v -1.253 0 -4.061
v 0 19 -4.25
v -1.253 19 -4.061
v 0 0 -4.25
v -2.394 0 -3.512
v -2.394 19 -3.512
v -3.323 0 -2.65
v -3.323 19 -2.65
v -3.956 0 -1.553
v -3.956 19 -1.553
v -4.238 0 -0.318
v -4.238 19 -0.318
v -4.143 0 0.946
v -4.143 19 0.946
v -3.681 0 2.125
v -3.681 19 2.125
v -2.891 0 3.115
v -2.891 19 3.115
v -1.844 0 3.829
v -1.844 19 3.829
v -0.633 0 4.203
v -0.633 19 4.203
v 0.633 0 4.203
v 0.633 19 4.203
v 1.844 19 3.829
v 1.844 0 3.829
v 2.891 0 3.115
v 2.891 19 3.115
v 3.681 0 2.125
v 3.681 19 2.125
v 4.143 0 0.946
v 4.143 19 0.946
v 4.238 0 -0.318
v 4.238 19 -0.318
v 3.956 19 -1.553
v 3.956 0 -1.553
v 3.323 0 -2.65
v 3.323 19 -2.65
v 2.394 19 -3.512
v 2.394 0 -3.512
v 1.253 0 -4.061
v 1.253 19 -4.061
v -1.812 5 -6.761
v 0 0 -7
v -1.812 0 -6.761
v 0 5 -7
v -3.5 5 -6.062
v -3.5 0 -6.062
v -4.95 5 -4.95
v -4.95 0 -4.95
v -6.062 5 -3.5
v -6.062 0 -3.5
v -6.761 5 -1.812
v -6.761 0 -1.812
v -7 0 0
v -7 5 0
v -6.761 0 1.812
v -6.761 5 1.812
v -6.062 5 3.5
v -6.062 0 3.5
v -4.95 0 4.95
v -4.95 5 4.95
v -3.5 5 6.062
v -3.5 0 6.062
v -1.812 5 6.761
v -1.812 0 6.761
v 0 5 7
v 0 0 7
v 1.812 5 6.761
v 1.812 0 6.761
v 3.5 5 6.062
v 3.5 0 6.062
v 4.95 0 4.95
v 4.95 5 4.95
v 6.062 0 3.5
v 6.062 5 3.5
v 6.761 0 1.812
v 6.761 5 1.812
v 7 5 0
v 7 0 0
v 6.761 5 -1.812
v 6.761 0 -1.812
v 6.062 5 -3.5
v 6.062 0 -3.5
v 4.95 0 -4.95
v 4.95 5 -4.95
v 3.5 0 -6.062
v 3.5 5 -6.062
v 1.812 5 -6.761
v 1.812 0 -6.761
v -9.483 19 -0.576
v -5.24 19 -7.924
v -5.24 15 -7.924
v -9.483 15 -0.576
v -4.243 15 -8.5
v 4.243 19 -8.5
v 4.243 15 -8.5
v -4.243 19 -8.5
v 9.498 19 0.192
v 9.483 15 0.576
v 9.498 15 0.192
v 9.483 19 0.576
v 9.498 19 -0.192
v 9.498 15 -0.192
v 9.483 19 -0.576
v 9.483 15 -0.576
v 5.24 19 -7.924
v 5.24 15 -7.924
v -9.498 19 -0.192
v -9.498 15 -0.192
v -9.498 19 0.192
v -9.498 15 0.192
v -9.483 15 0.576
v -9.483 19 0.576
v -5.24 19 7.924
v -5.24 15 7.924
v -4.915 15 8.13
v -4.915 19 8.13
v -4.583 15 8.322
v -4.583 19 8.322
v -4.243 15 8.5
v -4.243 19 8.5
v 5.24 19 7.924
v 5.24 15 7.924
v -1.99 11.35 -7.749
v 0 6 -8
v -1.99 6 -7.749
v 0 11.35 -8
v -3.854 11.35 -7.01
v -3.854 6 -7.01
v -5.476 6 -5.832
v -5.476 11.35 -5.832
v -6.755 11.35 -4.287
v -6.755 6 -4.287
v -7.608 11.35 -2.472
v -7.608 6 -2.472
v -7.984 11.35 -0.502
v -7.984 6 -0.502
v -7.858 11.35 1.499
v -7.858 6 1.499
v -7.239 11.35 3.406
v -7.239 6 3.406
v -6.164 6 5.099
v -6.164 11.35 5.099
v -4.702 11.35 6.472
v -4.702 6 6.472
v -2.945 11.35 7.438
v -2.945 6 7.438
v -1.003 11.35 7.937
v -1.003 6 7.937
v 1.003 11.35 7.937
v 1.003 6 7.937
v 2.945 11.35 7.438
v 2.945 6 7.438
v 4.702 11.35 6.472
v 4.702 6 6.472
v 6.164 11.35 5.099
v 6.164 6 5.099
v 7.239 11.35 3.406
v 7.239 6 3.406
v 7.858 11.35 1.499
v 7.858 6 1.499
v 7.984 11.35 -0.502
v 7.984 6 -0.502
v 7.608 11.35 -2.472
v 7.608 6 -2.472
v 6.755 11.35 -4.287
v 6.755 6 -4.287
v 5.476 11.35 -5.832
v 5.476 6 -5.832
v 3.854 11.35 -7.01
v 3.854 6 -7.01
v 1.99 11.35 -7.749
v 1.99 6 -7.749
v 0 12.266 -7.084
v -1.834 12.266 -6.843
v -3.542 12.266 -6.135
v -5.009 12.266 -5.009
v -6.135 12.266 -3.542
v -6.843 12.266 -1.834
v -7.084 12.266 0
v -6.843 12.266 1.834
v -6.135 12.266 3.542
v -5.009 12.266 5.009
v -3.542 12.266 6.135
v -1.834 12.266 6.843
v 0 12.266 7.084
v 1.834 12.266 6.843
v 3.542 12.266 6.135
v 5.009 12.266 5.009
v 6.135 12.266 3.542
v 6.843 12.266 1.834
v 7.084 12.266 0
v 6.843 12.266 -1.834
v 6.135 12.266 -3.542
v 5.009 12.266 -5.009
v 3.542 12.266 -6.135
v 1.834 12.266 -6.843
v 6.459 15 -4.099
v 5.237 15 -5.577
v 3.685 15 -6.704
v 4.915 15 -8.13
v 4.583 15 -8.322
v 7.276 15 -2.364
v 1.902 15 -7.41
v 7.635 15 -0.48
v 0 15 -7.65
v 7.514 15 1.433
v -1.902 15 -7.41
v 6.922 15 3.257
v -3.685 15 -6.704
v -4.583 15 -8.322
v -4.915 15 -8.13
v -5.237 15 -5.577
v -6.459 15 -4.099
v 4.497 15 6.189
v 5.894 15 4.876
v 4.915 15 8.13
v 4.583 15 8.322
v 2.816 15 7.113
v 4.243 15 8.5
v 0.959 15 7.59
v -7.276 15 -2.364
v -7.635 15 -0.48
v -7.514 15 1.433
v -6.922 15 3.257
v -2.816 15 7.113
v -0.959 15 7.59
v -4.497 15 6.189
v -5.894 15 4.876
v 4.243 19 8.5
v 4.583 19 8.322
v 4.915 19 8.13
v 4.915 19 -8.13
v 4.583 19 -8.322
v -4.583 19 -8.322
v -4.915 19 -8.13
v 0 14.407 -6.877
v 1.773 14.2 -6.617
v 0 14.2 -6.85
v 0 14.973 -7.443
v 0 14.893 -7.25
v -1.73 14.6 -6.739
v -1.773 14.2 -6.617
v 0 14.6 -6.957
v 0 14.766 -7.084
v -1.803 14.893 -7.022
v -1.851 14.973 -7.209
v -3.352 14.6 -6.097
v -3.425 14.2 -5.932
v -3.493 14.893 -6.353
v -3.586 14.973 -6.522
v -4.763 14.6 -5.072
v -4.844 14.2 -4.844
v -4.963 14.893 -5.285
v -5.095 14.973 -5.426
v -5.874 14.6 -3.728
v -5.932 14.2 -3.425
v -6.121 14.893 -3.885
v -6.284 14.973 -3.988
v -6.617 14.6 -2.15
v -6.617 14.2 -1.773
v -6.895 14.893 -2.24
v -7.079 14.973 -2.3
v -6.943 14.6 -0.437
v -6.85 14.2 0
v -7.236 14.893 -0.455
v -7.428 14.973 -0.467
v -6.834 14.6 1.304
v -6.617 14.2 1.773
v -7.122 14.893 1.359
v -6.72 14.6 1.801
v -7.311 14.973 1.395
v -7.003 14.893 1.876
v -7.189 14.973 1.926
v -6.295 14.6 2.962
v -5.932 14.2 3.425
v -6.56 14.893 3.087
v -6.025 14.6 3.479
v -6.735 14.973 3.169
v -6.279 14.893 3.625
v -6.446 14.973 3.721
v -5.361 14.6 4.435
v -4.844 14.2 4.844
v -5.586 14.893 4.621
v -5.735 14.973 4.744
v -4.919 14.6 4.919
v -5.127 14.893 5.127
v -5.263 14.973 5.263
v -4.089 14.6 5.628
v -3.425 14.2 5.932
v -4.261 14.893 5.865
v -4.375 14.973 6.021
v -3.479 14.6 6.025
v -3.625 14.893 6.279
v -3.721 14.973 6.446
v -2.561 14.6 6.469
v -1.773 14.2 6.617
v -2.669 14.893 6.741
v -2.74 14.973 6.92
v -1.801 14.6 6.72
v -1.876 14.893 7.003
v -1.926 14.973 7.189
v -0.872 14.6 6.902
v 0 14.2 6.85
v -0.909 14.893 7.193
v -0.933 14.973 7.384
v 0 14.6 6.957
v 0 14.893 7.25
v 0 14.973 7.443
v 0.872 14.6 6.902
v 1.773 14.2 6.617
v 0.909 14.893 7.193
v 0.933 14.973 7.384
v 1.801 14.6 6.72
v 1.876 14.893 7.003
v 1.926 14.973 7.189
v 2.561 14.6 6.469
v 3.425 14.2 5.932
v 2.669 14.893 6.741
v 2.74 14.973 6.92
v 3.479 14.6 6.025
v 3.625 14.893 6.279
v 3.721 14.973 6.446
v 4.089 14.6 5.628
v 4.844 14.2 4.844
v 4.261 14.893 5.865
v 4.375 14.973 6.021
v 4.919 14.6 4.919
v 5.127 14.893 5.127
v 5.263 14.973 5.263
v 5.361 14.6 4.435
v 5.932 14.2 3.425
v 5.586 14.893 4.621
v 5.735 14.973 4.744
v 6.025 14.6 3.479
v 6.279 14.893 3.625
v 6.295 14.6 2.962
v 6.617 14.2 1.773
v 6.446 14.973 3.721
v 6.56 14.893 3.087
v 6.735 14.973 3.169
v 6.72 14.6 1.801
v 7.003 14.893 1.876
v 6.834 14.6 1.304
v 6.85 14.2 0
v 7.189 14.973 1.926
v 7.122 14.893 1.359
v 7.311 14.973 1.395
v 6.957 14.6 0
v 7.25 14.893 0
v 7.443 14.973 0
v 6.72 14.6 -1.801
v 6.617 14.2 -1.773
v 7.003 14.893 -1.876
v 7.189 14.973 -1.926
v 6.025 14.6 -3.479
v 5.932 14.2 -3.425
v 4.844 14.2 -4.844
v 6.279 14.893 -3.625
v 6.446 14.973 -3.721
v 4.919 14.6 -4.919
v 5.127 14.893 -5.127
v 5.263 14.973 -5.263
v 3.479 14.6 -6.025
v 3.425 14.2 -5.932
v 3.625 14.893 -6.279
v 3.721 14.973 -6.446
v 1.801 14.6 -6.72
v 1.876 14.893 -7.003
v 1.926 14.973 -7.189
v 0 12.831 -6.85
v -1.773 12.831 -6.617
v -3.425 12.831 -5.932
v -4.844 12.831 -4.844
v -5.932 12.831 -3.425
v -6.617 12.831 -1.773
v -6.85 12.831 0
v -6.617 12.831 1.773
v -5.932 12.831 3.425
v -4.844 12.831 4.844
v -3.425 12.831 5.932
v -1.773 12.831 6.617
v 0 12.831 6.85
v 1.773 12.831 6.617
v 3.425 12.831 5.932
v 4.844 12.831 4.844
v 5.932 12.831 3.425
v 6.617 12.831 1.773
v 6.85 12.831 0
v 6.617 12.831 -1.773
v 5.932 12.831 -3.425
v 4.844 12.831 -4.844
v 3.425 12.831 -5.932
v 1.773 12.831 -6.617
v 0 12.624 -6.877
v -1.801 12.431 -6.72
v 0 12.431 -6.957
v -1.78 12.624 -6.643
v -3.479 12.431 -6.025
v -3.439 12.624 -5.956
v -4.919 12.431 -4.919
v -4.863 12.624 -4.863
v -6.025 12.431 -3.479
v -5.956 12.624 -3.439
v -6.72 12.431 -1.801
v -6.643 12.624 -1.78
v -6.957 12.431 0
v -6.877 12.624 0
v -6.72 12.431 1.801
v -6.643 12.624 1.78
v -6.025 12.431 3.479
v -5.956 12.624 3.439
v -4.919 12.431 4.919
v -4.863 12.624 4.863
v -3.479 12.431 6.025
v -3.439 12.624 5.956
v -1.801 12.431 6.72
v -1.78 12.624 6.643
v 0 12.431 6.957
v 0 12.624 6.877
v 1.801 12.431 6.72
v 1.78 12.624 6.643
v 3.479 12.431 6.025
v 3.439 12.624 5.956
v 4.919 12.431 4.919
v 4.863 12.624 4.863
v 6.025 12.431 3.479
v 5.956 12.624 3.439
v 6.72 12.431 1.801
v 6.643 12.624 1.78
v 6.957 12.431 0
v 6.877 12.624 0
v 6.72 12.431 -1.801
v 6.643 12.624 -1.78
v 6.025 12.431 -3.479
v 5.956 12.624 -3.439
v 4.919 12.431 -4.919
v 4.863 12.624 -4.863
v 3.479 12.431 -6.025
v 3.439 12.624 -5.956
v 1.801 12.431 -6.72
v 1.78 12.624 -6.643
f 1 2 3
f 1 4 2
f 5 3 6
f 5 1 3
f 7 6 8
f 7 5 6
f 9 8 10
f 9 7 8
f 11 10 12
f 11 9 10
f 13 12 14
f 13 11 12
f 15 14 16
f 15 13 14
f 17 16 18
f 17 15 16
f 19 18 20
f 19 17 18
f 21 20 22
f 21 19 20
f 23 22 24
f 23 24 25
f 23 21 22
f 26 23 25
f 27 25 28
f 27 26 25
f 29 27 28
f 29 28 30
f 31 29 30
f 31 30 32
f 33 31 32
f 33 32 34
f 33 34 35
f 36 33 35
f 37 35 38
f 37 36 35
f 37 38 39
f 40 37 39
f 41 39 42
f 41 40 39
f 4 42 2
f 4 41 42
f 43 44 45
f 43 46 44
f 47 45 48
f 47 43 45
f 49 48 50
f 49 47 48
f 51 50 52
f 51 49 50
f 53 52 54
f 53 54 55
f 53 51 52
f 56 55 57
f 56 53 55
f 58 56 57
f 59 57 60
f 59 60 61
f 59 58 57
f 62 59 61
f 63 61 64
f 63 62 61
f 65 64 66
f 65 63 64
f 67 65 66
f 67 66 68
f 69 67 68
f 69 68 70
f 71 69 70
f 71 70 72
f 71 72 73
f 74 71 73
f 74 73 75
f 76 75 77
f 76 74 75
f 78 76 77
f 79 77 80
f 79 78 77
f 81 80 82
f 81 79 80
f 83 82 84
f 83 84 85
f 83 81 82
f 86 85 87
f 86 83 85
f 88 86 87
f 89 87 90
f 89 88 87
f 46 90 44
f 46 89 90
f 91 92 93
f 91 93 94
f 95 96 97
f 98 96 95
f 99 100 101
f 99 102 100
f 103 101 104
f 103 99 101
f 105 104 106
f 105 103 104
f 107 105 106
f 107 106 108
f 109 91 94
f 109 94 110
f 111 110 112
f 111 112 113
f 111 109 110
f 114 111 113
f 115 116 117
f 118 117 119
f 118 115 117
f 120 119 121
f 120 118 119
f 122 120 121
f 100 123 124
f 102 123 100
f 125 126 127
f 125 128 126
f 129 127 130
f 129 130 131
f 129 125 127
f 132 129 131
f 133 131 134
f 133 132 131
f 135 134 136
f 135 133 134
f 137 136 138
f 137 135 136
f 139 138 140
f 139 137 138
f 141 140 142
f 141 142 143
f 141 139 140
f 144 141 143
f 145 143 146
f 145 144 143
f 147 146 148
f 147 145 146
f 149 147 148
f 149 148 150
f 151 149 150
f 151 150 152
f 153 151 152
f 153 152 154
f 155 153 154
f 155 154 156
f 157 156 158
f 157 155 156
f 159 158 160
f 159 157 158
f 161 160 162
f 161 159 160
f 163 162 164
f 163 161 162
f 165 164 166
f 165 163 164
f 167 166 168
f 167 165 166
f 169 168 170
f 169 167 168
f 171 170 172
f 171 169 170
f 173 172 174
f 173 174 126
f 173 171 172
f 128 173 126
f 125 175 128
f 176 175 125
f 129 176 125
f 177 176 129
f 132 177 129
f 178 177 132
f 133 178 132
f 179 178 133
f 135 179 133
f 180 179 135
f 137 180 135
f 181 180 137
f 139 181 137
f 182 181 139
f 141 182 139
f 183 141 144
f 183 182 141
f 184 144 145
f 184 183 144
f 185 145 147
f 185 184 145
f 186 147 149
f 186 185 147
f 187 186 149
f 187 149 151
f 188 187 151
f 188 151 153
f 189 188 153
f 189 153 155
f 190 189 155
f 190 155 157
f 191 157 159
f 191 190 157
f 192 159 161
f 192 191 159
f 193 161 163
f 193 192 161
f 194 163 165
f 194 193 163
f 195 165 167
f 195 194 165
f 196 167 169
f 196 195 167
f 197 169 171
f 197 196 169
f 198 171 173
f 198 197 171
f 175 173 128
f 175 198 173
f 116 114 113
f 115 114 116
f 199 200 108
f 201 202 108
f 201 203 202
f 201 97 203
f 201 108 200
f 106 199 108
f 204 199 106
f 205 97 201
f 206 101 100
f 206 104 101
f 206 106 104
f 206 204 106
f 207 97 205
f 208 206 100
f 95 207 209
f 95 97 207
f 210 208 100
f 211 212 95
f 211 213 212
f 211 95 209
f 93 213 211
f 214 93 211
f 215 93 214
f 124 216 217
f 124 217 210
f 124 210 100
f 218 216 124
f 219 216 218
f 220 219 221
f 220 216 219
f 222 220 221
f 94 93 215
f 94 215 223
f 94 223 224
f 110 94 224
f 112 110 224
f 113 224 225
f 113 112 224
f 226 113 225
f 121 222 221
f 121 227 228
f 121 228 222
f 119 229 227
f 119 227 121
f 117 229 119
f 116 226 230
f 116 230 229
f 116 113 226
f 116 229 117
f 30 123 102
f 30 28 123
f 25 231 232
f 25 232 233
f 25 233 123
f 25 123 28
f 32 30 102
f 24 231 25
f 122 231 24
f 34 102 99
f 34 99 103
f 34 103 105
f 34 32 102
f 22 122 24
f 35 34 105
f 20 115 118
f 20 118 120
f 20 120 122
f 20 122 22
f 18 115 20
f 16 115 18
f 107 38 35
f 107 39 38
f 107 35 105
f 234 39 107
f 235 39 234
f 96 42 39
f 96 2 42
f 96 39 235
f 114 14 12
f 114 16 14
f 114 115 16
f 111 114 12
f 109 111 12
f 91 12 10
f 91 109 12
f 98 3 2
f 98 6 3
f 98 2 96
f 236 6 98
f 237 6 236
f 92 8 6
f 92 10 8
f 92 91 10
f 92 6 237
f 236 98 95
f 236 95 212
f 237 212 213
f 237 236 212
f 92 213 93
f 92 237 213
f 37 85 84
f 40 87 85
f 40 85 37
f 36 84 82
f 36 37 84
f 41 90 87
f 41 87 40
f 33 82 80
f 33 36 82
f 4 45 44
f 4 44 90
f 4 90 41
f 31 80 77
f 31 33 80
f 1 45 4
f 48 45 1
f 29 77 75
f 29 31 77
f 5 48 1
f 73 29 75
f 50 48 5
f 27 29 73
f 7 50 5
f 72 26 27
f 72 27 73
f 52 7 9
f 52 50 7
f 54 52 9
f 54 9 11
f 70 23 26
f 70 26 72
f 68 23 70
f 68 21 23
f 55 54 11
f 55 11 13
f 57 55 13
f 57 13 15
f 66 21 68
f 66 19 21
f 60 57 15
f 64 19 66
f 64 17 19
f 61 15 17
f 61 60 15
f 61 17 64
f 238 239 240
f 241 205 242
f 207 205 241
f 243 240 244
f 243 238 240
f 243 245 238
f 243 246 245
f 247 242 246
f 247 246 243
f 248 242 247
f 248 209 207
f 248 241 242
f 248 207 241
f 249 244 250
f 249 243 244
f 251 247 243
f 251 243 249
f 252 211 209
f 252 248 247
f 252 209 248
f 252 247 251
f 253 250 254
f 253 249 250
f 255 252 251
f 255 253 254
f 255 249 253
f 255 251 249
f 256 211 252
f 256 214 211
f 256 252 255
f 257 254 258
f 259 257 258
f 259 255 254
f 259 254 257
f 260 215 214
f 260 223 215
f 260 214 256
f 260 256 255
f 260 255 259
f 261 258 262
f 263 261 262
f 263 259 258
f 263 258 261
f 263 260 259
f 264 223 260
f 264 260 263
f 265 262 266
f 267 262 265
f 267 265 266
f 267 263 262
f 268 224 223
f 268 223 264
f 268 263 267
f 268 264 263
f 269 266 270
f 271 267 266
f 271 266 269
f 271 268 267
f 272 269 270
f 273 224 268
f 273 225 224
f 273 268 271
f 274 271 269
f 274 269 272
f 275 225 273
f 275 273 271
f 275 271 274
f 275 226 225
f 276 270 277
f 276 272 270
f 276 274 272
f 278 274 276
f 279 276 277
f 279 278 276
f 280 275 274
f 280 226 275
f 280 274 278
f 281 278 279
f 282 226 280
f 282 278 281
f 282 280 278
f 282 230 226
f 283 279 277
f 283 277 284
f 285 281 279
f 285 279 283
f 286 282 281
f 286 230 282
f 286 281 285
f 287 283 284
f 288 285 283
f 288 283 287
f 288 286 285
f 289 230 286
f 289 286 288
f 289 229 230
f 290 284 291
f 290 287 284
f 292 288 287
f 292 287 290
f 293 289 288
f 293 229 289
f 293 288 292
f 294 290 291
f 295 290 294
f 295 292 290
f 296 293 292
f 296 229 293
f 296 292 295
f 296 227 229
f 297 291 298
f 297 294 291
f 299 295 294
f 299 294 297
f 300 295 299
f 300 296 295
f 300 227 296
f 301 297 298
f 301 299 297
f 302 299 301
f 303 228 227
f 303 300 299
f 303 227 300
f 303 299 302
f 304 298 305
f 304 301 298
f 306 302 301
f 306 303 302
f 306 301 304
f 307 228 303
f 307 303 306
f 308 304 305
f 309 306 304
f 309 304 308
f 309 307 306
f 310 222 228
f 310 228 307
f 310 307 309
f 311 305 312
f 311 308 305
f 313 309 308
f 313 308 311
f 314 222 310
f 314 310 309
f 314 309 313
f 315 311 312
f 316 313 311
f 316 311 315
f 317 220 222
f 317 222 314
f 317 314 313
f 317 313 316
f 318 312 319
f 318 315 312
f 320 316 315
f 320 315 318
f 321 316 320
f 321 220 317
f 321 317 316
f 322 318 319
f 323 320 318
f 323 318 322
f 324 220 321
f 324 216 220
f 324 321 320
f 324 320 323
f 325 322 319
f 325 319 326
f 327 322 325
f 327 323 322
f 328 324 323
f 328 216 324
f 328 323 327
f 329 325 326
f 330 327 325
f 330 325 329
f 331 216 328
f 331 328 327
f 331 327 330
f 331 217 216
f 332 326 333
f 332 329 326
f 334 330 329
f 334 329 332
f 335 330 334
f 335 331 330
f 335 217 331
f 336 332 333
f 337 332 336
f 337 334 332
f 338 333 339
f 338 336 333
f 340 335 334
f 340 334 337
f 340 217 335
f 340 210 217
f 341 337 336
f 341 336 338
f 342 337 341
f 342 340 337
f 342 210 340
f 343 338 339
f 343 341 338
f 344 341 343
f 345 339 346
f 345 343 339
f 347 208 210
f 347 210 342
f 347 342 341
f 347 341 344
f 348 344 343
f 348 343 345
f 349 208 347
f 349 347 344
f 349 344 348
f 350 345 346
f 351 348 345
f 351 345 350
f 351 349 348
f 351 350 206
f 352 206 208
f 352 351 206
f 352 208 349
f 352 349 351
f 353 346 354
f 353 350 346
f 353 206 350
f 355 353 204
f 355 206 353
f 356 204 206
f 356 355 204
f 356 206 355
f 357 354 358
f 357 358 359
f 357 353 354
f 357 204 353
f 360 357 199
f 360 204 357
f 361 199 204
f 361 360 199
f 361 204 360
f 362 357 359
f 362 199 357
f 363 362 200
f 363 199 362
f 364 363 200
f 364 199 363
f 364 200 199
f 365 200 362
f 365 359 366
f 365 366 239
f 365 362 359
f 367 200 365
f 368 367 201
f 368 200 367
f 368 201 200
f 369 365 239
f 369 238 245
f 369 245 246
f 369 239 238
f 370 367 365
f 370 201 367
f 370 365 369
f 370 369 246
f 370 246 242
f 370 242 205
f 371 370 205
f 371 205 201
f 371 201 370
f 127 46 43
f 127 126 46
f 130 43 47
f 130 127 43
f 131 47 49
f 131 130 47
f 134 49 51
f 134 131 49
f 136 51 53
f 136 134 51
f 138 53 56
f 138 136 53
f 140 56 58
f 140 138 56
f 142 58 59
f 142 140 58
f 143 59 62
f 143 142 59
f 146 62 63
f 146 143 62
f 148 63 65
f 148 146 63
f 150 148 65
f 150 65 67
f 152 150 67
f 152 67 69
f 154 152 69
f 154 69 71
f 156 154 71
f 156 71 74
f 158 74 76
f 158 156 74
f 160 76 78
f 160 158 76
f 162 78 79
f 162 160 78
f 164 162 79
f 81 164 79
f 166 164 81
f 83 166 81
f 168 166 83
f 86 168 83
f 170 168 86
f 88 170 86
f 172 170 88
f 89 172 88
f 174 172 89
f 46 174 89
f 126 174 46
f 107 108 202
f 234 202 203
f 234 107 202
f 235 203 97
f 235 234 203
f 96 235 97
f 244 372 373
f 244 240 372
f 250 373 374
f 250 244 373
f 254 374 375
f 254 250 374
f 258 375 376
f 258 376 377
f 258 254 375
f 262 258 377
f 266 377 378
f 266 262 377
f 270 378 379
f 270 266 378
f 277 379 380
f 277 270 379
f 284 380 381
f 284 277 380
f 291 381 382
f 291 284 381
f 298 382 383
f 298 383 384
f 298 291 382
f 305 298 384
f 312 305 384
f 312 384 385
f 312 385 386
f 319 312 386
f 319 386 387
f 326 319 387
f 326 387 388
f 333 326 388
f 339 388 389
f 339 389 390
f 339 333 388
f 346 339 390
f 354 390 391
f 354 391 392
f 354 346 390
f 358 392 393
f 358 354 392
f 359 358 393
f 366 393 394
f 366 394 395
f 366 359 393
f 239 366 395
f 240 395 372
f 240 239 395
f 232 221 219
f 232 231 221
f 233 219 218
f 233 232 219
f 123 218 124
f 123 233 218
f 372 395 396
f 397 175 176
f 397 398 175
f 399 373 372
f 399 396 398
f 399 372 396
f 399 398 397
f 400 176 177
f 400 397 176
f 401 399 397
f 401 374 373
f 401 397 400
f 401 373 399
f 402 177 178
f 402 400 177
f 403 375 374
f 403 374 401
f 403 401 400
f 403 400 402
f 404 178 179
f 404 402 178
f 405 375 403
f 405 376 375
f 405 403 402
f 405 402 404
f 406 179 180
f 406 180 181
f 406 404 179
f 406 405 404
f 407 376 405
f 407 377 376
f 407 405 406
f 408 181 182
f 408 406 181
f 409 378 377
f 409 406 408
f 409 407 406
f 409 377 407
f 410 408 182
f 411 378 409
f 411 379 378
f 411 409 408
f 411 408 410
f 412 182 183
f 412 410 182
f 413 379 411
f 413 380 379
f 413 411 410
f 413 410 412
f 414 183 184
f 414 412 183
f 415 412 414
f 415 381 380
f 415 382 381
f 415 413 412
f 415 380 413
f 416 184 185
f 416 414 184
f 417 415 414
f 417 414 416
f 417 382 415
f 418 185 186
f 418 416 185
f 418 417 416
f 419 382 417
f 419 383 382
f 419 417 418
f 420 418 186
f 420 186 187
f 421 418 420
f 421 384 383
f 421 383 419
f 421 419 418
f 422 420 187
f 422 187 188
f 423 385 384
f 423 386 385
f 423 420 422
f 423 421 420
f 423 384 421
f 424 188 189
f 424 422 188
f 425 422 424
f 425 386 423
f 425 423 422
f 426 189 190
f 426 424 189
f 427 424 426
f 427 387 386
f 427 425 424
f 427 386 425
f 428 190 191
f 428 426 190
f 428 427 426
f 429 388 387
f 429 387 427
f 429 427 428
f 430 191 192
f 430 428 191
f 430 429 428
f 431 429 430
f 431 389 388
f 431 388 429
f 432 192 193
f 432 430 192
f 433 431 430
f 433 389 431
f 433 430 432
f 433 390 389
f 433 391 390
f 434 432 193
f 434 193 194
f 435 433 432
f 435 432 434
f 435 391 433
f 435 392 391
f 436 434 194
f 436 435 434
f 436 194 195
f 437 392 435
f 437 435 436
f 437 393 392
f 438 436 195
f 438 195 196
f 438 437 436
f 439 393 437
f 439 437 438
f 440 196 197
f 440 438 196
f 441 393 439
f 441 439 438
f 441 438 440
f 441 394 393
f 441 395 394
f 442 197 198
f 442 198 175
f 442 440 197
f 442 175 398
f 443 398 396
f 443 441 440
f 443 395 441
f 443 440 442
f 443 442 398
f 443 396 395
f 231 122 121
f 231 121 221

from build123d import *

# Parameters (mm, degrees)
SKETCH_2_OUTSIDE_W  = 27.582
SKETCH_2_OUTSIDE_H  = 27.582
CUT_EXTRUDE_1_DEPTH = 24.270152556


with BuildPart() as part:
    # Эскиз1 → Повернуть1 (revolve)
    with BuildSketch(Plane.XY, mode=Mode.PRIVATE) as revolve_1_sk:
        with BuildLine():
            Line((-4.25, 0), (-7, 0))
            Line((-7, 0), (-7, 5))
            Line((-7, 5), (-8, 6))
            Line((-8, 6), (-8, 11.35))
            Line((-8, 11.35), (-7.084314575, 12.265685425))
            ThreePointArc((-7.084314575, 12.265685425), (-6.910896374, 12.525224104), (-6.85, 12.83137085))
            Line((-6.85, 12.83137085), (-6.85, 14.2))
            ThreePointArc((-6.85, 14.2), (-7.084314575, 14.765685425), (-7.65, 15))
            Line((-7.65, 15), (-9.5, 15))
            Line((-9.5, 15), (-9.5, 19))
            Line((-9.5, 19), (-4.25, 19))
            Line((-4.25, 19), (-4.25, 0))
        make_face()
    revolve(revolve_1_sk.sketch.rotate(Axis((0, 0, 0), (0, 1, 0)), 270), axis=Axis((0, 0, 0), (0, 1, 0)))

    # Эскиз2 outside → Вырез-Вытянуть1 (cut, through all)
    with BuildSketch(Plane(origin=(0, 19, 0), x_dir=(1, 0, 0), z_dir=(0, 1, 0))):
        Rectangle(SKETCH_2_OUTSIDE_W, SKETCH_2_OUTSIDE_H)
        Polygon((9.814954576, 0), (4.907477288, 8.5), (-4.907477288, 8.5), (-9.814954576, 0), (-4.907477288, -8.5), (4.907477288, -8.5), align=None, mode=Mode.SUBTRACT)
    extrude(amount=-CUT_EXTRUDE_1_DEPTH, mode=Mode.SUBTRACT)


solid = part.part
